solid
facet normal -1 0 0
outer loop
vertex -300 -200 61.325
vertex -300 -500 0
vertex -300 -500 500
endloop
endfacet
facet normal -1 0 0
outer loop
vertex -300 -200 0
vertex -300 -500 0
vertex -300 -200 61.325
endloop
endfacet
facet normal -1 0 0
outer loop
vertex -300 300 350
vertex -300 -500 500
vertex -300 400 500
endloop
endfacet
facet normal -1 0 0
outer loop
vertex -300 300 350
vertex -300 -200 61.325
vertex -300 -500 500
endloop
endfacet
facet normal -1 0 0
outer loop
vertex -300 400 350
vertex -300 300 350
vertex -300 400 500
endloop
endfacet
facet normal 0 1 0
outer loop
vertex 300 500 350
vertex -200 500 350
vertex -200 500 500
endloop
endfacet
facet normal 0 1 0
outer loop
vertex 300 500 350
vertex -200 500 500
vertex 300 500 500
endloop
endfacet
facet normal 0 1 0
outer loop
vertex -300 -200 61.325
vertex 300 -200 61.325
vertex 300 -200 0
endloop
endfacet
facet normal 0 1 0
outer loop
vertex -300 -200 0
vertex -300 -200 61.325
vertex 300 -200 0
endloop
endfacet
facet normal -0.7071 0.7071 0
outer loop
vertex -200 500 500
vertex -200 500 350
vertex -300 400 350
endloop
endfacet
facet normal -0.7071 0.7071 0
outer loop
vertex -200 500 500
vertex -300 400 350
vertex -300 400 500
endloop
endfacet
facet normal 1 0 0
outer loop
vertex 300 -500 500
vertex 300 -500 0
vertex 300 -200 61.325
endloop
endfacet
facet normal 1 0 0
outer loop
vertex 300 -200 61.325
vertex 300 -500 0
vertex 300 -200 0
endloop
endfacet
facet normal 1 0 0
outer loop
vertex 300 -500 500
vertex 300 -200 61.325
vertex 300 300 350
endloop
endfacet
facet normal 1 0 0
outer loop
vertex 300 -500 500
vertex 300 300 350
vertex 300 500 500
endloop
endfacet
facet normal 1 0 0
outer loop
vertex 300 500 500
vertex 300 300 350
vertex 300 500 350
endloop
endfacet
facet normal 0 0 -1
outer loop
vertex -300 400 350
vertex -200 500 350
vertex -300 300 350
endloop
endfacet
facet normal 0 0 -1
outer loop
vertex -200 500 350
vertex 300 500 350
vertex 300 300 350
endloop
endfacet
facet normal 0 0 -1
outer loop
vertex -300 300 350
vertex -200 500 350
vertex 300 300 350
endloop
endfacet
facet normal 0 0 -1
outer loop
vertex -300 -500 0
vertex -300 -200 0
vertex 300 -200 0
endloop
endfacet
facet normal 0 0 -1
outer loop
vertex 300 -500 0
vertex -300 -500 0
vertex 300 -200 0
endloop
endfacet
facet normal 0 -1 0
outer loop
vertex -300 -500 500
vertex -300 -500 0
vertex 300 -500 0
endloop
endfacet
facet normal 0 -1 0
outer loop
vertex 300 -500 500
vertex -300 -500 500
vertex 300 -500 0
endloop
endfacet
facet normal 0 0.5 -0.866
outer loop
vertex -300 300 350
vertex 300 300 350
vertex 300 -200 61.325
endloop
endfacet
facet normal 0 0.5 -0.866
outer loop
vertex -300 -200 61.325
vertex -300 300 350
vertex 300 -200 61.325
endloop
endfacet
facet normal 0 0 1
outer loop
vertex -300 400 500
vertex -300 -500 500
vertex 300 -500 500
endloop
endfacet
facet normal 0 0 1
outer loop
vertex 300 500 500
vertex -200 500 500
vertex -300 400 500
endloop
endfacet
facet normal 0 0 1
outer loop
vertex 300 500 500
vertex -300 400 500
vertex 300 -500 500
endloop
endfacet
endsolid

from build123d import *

# Parameters (mm, degrees)
F0_W     = 600
F0_H     = 1000
F1_DEPTH = 500
F3_DEPTH = 600.001
F4_SIZE  = 100


with BuildPart() as f1:
    # F0 (on Top) → F1 (new body)
    with BuildSketch(Plane.XY):
        Rectangle(F0_W, F0_H)
    extrude(amount=F1_DEPTH)

    # F2 (on face) → F3 (cut, through all)
    with BuildSketch(Plane.YZ.offset(300)):
        Polygon((-200, 61.324865), (-200, 0), (500, 0), (500, 350), (300, 350), align=None)
    extrude(amount=-F3_DEPTH, mode=Mode.SUBTRACT)

    # F4
    f4_edges = [f1.edges().sort_by_distance(p)[0] for p in [
        (-300, 500, 425),
    ]]
    chamfer(f4_edges, length=F4_SIZE)


solid = f1.part
